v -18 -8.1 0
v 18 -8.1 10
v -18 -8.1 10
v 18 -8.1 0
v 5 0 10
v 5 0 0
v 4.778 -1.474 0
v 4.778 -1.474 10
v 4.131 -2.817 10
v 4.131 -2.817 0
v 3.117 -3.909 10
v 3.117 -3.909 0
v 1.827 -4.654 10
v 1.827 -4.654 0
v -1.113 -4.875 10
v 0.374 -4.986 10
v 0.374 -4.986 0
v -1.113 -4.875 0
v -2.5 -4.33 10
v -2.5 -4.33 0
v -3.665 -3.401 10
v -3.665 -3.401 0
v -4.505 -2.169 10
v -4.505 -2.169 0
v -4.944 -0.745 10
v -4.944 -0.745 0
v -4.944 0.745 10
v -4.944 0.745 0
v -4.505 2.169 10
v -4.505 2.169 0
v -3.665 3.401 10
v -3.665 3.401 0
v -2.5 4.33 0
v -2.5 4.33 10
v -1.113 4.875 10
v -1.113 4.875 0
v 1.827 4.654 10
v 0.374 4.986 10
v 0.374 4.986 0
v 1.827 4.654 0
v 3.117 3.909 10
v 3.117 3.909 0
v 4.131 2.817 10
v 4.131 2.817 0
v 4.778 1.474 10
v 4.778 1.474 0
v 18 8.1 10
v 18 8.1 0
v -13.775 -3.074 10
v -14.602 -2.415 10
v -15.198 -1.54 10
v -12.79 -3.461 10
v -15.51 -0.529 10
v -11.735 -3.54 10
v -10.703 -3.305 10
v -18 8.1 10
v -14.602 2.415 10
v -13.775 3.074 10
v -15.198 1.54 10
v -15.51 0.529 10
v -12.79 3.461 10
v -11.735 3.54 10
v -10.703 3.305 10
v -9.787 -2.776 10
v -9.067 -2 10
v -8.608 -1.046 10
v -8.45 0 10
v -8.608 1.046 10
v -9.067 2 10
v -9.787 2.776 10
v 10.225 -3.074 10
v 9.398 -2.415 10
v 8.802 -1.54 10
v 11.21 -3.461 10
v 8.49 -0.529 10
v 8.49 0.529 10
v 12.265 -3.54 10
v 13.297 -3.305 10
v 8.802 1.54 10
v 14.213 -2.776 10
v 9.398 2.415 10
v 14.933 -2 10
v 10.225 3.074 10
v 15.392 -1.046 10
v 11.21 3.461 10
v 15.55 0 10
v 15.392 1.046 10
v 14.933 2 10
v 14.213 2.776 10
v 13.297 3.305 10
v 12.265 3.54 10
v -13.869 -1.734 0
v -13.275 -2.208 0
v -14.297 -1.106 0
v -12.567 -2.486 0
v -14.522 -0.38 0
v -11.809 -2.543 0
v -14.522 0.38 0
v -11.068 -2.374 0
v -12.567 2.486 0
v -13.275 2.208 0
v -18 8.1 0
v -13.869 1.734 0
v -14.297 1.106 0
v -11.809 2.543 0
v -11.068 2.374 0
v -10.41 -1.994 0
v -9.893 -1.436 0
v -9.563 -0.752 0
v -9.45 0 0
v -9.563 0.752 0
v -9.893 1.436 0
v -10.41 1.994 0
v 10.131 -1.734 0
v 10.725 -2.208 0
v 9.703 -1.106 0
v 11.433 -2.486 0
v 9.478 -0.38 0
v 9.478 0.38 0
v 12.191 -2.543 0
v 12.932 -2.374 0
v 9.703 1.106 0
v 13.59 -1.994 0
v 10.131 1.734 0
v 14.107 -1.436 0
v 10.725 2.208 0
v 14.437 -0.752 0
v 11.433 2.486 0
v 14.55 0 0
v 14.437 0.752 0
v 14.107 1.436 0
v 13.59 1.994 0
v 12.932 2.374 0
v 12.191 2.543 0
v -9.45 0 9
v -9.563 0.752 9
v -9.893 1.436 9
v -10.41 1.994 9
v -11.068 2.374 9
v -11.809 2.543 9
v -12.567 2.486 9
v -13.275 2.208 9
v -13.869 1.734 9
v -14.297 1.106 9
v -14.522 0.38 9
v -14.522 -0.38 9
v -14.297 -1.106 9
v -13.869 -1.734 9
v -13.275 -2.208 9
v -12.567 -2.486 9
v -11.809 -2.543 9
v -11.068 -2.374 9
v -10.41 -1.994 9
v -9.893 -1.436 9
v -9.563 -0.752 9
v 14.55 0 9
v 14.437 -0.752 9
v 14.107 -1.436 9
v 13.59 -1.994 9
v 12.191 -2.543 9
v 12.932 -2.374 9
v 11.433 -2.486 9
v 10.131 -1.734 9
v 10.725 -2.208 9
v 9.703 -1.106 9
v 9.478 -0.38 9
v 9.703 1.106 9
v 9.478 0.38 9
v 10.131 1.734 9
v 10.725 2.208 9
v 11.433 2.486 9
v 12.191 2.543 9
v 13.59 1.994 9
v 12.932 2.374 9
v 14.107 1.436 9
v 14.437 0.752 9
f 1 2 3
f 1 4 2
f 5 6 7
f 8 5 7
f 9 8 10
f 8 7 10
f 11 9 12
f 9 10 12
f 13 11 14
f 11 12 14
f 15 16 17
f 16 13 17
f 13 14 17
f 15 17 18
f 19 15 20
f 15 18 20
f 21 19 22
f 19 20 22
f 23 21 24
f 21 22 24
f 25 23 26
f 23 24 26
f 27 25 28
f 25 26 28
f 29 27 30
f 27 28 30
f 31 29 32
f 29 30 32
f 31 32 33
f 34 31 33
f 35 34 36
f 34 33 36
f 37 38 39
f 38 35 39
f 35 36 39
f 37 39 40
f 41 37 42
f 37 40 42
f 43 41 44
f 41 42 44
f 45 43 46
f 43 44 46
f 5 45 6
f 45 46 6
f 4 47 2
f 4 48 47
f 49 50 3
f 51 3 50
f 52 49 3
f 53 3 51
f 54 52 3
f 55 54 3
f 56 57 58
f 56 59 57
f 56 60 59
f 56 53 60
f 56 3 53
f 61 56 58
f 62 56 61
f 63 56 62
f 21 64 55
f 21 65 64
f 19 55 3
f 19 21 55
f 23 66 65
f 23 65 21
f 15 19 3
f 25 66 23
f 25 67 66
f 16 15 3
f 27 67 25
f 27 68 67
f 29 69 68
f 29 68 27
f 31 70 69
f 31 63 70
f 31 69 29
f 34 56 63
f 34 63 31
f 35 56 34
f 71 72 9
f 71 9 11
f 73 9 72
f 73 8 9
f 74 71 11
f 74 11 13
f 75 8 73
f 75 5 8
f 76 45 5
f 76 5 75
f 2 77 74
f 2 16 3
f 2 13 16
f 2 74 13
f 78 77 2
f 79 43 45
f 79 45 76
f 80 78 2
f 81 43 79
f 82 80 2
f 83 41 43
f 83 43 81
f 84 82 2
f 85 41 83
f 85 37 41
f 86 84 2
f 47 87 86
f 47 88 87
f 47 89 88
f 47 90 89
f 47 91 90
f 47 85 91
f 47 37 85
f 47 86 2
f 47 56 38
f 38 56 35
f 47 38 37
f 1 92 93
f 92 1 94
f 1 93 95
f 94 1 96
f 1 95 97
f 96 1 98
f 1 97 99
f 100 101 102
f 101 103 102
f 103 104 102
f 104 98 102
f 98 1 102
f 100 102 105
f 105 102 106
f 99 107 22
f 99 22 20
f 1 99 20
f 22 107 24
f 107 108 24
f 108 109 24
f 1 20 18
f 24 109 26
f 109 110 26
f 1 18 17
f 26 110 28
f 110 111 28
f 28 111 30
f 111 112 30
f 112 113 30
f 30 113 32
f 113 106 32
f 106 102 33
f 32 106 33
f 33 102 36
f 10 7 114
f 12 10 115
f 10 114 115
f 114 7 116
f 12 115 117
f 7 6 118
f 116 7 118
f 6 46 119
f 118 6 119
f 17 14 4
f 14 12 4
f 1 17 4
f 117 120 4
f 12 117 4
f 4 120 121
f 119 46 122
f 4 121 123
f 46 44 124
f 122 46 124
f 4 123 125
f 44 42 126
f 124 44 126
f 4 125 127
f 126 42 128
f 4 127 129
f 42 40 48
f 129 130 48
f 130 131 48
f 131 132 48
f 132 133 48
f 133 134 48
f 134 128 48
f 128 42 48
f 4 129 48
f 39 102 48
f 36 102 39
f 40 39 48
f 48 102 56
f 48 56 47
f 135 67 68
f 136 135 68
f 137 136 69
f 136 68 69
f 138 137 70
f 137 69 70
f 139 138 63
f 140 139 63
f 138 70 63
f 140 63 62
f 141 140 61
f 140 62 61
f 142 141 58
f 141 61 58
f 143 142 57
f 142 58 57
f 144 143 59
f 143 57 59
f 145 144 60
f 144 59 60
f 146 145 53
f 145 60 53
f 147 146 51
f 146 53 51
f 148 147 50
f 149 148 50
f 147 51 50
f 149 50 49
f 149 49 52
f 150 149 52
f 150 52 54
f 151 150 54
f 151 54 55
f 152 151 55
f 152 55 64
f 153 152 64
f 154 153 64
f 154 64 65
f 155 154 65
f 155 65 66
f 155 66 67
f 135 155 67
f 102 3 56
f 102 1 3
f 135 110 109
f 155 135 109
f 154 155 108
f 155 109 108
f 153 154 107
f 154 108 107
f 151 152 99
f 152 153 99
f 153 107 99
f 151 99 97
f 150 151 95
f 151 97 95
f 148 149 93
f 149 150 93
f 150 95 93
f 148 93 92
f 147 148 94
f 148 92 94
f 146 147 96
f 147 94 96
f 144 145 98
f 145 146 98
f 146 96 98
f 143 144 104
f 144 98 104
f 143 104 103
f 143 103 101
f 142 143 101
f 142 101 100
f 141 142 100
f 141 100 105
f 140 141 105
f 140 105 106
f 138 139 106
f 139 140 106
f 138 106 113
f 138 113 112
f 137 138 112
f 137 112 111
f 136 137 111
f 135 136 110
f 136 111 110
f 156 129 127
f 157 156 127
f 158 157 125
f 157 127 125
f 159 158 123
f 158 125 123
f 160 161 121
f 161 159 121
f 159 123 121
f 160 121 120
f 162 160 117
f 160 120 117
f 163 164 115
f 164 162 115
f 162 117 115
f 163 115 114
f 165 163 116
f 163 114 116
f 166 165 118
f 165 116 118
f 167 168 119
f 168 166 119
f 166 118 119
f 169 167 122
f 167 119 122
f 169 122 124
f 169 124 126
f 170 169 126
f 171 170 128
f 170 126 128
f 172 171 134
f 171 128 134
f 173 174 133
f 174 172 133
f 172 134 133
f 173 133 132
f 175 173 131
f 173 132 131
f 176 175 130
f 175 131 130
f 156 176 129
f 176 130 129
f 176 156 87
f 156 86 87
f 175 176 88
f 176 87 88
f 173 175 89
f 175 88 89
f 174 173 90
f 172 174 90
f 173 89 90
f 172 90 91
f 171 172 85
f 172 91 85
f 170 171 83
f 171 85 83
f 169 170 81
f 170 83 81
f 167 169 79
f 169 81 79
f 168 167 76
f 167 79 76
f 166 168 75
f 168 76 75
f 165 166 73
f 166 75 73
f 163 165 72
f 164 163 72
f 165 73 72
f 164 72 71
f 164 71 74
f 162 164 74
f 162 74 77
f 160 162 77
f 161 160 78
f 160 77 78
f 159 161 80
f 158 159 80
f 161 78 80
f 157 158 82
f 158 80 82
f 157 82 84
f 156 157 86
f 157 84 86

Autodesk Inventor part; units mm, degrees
ref_plane "YZ Plane" through (0, 0, 0) normal (1, 0, 0) x (0, 1, 0)
ref_plane "XZ Plane" through (0, 0, 0) normal (0, 1, 0) x (-1, 0, 0)
ref_plane "XY Plane" through (0, 0, 0) normal (0, 0, 1) x (1, 0, 0)
sketch "Sketch1" plane through (0, 0, 0) normal (0, 0, 1) x (1, 0, 0)
  line L0 (-18, 8.1) -> (18, 8.1)
  line L1 (18, 8.1) -> (18, -8.1)
  line L2 (18, -8.1) -> (-18, -8.1)
  line L3 (-18, -8.1) -> (-18, 8.1)
  line L4 (0, 11.34) -> (0, -11.34) construction
  line L5 (-25.2, 0) -> (25.2, 0) construction
  circle A0 centre (0, 0) radius 5
  circle A1 centre (-12, 0) radius 2.55
  circle A2 centre (12, 0) radius 2.55
  dimension "d0" = 16.2
  dimension "d1" = 36
  dimension "d2" = 10
  dimension "d3" = 5.1
  dimension "d4" = 12
  dimension "d5" = 5.1
  dimension "d6" = 12
extrude "Extrusion1" add sketch "Sketch1" along normal blind 10
chamfer "Chamfer1" distance 1 angle 45 2 edges at (-14.55, 0, 10) (9.45, 0, 10)
equation "\"d5\" = d3"
equation "\"d6\" = d4"
properties part number "supporto guide x"
